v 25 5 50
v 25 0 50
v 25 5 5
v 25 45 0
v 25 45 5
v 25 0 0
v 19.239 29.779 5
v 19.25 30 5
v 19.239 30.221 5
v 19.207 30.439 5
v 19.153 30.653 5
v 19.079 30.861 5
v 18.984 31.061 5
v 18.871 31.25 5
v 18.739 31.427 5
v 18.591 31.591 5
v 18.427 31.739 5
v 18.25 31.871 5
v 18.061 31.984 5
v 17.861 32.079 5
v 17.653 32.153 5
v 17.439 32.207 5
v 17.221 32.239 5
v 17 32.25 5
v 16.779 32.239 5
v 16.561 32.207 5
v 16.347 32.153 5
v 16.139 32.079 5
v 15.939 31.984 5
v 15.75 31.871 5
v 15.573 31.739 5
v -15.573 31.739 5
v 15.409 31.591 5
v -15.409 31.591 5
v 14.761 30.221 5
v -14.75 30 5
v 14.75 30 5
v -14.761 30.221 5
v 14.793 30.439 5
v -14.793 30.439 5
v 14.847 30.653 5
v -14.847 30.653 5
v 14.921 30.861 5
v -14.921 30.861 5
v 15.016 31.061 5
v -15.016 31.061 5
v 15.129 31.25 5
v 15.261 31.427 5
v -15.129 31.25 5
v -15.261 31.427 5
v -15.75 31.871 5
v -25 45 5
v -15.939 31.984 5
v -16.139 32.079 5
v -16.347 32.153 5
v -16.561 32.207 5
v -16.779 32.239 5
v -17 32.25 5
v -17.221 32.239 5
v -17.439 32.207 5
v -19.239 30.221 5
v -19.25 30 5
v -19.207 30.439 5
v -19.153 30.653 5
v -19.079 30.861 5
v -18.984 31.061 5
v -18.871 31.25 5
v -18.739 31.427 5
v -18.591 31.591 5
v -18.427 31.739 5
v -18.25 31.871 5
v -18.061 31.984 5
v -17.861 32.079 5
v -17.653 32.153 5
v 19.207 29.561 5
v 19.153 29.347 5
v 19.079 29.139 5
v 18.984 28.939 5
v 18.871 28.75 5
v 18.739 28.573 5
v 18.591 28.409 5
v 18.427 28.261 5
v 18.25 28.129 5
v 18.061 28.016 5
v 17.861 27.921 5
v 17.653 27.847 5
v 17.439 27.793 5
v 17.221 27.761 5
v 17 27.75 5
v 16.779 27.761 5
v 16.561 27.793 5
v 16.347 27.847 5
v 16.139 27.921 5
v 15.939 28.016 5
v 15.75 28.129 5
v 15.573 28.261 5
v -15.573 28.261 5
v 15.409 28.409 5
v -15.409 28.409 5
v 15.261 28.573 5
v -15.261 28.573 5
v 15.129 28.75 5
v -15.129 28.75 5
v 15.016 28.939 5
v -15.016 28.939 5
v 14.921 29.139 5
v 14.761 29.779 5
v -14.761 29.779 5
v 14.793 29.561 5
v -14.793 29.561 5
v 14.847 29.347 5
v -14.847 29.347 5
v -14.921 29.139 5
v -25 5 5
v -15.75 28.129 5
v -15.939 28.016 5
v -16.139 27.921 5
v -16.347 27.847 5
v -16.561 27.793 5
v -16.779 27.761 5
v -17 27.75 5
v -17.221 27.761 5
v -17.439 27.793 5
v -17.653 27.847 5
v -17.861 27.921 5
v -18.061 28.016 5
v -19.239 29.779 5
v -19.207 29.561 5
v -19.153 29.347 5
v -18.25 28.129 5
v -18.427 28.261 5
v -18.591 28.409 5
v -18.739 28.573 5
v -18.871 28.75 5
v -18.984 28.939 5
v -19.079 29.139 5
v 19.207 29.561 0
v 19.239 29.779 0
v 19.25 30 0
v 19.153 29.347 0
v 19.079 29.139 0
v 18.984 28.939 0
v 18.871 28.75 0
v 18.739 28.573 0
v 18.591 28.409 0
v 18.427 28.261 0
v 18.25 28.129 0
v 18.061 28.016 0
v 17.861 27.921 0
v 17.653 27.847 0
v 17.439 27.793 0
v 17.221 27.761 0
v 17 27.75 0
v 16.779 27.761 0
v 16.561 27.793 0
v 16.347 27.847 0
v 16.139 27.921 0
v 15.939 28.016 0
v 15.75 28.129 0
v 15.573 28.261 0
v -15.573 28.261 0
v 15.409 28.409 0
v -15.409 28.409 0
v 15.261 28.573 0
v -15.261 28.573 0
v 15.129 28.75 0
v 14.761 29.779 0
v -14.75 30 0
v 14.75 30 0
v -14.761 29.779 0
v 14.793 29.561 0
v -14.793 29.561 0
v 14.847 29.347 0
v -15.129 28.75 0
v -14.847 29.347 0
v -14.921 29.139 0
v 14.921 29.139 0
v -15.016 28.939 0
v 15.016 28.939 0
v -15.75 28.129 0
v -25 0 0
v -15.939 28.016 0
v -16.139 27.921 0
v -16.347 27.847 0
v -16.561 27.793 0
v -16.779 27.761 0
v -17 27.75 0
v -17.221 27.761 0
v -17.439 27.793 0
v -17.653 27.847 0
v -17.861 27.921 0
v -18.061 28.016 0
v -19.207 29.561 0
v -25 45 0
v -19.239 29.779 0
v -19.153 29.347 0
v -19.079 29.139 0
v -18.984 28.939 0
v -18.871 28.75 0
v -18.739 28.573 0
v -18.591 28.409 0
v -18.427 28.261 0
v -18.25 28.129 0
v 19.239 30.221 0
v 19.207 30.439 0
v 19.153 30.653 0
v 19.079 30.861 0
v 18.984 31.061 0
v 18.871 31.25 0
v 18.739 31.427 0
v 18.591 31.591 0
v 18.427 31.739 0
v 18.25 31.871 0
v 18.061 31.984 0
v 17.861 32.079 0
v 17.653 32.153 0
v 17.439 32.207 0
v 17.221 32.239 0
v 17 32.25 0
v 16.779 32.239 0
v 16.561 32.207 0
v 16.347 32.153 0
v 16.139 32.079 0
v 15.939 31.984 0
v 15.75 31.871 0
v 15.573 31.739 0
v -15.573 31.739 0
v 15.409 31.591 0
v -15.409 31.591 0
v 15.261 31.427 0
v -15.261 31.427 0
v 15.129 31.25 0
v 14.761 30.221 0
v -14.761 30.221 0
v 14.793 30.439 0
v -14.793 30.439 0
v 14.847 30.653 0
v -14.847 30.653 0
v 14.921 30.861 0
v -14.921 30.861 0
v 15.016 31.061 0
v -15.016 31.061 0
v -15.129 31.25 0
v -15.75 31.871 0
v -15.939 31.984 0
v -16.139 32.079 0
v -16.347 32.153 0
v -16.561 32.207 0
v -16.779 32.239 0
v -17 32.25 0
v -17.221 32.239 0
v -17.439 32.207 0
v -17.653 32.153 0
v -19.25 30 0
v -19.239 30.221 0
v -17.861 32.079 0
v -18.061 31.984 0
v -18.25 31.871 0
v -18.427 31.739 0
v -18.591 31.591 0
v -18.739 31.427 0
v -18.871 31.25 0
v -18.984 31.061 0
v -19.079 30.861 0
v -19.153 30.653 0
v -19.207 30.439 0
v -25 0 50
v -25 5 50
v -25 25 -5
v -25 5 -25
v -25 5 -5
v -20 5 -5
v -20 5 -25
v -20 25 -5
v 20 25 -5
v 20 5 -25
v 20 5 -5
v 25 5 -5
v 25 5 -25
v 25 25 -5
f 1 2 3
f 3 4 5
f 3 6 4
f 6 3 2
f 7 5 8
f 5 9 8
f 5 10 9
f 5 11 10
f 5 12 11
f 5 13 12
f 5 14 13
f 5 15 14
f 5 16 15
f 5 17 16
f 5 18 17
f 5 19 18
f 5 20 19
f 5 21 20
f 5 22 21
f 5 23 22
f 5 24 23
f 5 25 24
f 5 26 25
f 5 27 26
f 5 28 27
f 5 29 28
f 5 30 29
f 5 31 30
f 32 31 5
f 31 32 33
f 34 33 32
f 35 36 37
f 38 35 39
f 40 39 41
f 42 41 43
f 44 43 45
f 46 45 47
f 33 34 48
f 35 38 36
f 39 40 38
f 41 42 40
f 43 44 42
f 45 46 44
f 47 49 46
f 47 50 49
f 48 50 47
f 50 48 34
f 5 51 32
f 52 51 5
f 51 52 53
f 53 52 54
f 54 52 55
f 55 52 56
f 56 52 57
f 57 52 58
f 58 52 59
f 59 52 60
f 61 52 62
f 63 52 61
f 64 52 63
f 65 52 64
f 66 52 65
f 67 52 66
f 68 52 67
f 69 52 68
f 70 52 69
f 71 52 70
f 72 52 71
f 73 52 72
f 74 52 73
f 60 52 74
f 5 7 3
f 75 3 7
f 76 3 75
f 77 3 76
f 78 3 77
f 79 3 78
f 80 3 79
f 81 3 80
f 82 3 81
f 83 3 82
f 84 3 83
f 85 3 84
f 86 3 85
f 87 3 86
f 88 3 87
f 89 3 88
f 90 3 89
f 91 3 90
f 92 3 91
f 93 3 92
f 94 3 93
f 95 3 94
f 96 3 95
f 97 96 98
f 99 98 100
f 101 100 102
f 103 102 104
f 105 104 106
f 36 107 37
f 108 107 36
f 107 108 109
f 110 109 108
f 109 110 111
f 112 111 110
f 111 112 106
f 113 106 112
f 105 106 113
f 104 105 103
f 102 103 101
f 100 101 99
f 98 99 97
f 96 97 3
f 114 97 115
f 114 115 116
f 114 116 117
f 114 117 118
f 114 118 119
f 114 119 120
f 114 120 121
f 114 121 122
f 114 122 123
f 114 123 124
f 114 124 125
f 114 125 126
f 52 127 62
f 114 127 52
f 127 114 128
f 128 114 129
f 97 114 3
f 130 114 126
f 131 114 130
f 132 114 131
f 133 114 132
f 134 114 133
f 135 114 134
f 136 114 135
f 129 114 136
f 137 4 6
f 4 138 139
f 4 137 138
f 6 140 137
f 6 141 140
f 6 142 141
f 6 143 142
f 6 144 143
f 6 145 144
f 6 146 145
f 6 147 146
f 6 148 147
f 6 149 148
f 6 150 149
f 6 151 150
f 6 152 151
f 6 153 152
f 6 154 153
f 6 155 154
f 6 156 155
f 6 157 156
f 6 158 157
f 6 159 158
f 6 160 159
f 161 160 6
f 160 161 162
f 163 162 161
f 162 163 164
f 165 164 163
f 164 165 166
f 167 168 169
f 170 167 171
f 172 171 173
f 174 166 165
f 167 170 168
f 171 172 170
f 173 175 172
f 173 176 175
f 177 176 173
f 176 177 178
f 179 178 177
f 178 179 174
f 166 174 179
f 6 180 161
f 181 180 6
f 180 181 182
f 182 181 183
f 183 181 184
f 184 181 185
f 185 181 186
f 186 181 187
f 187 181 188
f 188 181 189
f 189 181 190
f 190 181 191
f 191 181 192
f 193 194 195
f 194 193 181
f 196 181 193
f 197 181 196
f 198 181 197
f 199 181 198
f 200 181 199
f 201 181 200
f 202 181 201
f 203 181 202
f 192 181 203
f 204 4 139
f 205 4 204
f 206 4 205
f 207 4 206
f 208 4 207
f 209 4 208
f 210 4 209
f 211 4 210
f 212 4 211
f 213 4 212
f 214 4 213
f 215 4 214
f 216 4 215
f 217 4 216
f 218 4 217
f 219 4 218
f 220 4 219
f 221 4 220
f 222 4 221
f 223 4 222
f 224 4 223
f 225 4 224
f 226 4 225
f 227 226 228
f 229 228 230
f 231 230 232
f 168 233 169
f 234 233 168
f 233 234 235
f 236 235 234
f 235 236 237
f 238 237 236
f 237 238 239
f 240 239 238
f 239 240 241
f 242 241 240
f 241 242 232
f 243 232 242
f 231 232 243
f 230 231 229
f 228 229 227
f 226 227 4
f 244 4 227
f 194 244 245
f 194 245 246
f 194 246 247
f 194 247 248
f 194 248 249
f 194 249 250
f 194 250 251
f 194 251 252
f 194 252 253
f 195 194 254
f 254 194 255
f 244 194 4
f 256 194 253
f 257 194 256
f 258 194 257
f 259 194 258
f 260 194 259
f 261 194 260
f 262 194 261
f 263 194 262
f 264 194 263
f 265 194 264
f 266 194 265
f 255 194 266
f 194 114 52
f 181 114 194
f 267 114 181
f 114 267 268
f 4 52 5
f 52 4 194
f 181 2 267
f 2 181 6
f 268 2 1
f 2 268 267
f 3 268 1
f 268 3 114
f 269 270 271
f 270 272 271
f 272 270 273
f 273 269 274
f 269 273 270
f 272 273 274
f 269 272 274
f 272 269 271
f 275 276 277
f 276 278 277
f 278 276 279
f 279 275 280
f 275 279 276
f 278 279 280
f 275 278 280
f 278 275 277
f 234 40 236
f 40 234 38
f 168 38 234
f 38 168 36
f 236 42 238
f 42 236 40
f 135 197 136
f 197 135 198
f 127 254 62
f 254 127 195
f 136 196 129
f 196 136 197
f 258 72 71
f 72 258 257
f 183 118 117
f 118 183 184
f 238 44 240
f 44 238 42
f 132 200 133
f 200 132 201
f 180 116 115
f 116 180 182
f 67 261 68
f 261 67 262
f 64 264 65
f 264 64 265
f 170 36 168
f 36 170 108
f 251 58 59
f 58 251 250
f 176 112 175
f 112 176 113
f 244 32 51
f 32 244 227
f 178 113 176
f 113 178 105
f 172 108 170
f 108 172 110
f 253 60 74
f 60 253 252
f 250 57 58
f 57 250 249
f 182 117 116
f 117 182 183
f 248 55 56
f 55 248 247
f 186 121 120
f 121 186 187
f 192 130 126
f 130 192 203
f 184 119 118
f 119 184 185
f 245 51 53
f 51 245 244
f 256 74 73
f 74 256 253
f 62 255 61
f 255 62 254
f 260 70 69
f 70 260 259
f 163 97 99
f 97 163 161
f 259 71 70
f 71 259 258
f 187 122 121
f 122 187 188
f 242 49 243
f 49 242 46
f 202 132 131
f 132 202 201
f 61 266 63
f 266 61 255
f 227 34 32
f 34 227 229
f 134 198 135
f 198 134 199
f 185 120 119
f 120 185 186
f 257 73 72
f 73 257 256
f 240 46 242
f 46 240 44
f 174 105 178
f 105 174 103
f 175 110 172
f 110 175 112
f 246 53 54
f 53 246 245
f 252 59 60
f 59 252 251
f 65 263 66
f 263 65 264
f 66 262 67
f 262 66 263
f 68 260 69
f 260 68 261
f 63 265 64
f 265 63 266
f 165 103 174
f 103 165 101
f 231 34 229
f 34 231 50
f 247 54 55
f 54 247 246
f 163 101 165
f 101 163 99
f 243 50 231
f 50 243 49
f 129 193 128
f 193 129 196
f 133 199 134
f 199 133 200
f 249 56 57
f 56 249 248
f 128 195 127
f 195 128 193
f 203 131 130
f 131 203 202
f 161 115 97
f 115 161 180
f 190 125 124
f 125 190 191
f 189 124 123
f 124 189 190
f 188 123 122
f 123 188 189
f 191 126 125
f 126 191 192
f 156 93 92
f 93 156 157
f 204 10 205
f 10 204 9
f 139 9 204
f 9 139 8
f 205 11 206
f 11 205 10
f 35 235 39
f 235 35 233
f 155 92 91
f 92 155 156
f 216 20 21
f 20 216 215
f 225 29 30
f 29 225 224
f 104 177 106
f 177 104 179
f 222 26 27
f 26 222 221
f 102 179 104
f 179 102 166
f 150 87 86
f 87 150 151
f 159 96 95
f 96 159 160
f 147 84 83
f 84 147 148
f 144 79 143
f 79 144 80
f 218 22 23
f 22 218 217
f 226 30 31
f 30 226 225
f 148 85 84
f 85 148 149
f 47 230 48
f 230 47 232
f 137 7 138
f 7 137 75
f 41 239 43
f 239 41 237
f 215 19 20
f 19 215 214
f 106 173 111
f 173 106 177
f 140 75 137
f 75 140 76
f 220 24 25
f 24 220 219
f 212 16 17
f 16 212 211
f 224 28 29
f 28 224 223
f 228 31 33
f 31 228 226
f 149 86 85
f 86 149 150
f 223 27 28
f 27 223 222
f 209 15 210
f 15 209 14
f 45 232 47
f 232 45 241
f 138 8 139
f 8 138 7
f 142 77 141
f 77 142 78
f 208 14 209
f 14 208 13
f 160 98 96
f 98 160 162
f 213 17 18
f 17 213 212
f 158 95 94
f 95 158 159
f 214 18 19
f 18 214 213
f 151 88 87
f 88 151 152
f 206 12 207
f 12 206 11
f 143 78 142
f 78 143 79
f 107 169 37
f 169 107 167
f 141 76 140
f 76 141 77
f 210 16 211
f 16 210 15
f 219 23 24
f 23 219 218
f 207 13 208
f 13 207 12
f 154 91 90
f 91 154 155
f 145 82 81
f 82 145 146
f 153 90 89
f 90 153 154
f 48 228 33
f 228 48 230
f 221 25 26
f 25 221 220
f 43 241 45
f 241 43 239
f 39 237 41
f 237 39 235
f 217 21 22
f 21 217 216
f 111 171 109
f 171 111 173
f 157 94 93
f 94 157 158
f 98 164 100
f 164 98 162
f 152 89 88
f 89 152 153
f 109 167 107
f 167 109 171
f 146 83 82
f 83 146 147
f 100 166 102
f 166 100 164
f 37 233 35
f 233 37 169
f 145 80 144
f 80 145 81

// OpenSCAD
// NEMA 17 L-shaped mounting bracket
// Print orientation: base plate on XY plane (z=0), builds upward (+Z)

$fn = 64;

// Base plate dimensions
base_x_min = -25;
base_x_max = 25;
base_y_min = 0;
base_y_max = 45;
base_z_min = 0;
base_z_max = 5;

// M4 through-holes in base plate
m4_hole_d = 4.5;
m4_hole_x1 = -17;
m4_hole_y1 = 30;
m4_hole_x2 = 17;
m4_hole_y2 = 30;

// Vertical motor plate dimensions
motor_x_min = -25;
motor_x_max = 25;
motor_y_min = 0;
motor_y_max = 5;
motor_z_min = 0;
motor_z_max = 50;

// Motor centring boss hole
boss_hole_d = 23;
boss_hole_x = 0;
boss_hole_z = 28;

// M3 screw holes on 31 mm square pattern
m3_hole_d = 3.4;
m3_square = 31;
m3_offset = m3_square / 2;  // 15.5 mm from centre

// Gusset dimensions
gusset_thick = 5;
gusset_leg_y = 20;
gusset_leg_z = 20;
gusset_y_corner = 5;   // right-angle corner y position
gusset_z_corner = 5;   // right-angle corner z position

// Left gusset x range
gusset_left_x_min = -25;
gusset_left_x_max = -20;

// Right gusset x range
gusset_right_x_min = 20;
gusset_right_x_max = 25;

// Helper: triangular gusset in YZ plane, extruded along X
// Profile drawn in YZ (via rotate), then extruded along +X
module gusset(x_min, x_max) {
    translate([x_min, 0, 0]) {
        rotate([0, 90, 0]) {
            linear_extrude(x_max - x_min) {
                polygon(points = [
                    [gusset_y_corner, gusset_z_corner],
                    [gusset_y_corner + gusset_leg_y, gusset_z_corner],
                    [gusset_y_corner, gusset_z_corner + gusset_leg_z]
                ]);
            }
        }
    }
}

// Helper: vertical through-hole in motor plate (along Y axis)
module motor_plate_hole(cx, cz, d) {
    translate([cx, -1, cz]) {
        rotate([90, 0, 0]) {
            cylinder(h = motor_y_max - motor_y_min + 2, d = d, $fn = $fn);
        }
    }
}

// Helper: vertical through-hole in base plate (along Z axis)
module base_plate_hole(cx, cy, d) {
    translate([cx, cy, -1]) {
        cylinder(h = base_z_max - base_z_min + 2, d = d, $fn = $fn);
    }
}

difference() {
    union() {
        // Base plate
        translate([base_x_min, base_y_min, base_z_min]) {
            cube([base_x_max - base_x_min, base_y_max - base_y_min, base_z_max - base_z_min]);
        }

        // Vertical motor plate
        translate([motor_x_min, motor_y_min, motor_z_min]) {
            cube([motor_x_max - motor_x_min, motor_y_max - motor_y_min, motor_z_max - motor_z_min]);
        }

        // Left gusset
        gusset(gusset_left_x_min, gusset_left_x_max);

        // Right gusset
        gusset(gusset_right_x_min, gusset_right_x_max);
    }

    // M4 holes in base plate
    base_plate_hole(m4_hole_x1, m4_hole_y1, m4_hole_d);
    base_plate_hole(m4_hole_x2, m4_hole_y2, m4_hole_d);

    // Boss hole in motor plate
    motor_plate_hole(boss_hole_x, boss_hole_z, boss_hole_d);

    // M3 screw holes in motor plate (31 mm square pattern)
    for (dx = [-m3_offset, m3_offset]) {
        for (dz = [-m3_offset, m3_offset]) {
            motor_plate_hole(boss_hole_x + dx, boss_hole_z + dz, m3_hole_d);
        }
    }
}
